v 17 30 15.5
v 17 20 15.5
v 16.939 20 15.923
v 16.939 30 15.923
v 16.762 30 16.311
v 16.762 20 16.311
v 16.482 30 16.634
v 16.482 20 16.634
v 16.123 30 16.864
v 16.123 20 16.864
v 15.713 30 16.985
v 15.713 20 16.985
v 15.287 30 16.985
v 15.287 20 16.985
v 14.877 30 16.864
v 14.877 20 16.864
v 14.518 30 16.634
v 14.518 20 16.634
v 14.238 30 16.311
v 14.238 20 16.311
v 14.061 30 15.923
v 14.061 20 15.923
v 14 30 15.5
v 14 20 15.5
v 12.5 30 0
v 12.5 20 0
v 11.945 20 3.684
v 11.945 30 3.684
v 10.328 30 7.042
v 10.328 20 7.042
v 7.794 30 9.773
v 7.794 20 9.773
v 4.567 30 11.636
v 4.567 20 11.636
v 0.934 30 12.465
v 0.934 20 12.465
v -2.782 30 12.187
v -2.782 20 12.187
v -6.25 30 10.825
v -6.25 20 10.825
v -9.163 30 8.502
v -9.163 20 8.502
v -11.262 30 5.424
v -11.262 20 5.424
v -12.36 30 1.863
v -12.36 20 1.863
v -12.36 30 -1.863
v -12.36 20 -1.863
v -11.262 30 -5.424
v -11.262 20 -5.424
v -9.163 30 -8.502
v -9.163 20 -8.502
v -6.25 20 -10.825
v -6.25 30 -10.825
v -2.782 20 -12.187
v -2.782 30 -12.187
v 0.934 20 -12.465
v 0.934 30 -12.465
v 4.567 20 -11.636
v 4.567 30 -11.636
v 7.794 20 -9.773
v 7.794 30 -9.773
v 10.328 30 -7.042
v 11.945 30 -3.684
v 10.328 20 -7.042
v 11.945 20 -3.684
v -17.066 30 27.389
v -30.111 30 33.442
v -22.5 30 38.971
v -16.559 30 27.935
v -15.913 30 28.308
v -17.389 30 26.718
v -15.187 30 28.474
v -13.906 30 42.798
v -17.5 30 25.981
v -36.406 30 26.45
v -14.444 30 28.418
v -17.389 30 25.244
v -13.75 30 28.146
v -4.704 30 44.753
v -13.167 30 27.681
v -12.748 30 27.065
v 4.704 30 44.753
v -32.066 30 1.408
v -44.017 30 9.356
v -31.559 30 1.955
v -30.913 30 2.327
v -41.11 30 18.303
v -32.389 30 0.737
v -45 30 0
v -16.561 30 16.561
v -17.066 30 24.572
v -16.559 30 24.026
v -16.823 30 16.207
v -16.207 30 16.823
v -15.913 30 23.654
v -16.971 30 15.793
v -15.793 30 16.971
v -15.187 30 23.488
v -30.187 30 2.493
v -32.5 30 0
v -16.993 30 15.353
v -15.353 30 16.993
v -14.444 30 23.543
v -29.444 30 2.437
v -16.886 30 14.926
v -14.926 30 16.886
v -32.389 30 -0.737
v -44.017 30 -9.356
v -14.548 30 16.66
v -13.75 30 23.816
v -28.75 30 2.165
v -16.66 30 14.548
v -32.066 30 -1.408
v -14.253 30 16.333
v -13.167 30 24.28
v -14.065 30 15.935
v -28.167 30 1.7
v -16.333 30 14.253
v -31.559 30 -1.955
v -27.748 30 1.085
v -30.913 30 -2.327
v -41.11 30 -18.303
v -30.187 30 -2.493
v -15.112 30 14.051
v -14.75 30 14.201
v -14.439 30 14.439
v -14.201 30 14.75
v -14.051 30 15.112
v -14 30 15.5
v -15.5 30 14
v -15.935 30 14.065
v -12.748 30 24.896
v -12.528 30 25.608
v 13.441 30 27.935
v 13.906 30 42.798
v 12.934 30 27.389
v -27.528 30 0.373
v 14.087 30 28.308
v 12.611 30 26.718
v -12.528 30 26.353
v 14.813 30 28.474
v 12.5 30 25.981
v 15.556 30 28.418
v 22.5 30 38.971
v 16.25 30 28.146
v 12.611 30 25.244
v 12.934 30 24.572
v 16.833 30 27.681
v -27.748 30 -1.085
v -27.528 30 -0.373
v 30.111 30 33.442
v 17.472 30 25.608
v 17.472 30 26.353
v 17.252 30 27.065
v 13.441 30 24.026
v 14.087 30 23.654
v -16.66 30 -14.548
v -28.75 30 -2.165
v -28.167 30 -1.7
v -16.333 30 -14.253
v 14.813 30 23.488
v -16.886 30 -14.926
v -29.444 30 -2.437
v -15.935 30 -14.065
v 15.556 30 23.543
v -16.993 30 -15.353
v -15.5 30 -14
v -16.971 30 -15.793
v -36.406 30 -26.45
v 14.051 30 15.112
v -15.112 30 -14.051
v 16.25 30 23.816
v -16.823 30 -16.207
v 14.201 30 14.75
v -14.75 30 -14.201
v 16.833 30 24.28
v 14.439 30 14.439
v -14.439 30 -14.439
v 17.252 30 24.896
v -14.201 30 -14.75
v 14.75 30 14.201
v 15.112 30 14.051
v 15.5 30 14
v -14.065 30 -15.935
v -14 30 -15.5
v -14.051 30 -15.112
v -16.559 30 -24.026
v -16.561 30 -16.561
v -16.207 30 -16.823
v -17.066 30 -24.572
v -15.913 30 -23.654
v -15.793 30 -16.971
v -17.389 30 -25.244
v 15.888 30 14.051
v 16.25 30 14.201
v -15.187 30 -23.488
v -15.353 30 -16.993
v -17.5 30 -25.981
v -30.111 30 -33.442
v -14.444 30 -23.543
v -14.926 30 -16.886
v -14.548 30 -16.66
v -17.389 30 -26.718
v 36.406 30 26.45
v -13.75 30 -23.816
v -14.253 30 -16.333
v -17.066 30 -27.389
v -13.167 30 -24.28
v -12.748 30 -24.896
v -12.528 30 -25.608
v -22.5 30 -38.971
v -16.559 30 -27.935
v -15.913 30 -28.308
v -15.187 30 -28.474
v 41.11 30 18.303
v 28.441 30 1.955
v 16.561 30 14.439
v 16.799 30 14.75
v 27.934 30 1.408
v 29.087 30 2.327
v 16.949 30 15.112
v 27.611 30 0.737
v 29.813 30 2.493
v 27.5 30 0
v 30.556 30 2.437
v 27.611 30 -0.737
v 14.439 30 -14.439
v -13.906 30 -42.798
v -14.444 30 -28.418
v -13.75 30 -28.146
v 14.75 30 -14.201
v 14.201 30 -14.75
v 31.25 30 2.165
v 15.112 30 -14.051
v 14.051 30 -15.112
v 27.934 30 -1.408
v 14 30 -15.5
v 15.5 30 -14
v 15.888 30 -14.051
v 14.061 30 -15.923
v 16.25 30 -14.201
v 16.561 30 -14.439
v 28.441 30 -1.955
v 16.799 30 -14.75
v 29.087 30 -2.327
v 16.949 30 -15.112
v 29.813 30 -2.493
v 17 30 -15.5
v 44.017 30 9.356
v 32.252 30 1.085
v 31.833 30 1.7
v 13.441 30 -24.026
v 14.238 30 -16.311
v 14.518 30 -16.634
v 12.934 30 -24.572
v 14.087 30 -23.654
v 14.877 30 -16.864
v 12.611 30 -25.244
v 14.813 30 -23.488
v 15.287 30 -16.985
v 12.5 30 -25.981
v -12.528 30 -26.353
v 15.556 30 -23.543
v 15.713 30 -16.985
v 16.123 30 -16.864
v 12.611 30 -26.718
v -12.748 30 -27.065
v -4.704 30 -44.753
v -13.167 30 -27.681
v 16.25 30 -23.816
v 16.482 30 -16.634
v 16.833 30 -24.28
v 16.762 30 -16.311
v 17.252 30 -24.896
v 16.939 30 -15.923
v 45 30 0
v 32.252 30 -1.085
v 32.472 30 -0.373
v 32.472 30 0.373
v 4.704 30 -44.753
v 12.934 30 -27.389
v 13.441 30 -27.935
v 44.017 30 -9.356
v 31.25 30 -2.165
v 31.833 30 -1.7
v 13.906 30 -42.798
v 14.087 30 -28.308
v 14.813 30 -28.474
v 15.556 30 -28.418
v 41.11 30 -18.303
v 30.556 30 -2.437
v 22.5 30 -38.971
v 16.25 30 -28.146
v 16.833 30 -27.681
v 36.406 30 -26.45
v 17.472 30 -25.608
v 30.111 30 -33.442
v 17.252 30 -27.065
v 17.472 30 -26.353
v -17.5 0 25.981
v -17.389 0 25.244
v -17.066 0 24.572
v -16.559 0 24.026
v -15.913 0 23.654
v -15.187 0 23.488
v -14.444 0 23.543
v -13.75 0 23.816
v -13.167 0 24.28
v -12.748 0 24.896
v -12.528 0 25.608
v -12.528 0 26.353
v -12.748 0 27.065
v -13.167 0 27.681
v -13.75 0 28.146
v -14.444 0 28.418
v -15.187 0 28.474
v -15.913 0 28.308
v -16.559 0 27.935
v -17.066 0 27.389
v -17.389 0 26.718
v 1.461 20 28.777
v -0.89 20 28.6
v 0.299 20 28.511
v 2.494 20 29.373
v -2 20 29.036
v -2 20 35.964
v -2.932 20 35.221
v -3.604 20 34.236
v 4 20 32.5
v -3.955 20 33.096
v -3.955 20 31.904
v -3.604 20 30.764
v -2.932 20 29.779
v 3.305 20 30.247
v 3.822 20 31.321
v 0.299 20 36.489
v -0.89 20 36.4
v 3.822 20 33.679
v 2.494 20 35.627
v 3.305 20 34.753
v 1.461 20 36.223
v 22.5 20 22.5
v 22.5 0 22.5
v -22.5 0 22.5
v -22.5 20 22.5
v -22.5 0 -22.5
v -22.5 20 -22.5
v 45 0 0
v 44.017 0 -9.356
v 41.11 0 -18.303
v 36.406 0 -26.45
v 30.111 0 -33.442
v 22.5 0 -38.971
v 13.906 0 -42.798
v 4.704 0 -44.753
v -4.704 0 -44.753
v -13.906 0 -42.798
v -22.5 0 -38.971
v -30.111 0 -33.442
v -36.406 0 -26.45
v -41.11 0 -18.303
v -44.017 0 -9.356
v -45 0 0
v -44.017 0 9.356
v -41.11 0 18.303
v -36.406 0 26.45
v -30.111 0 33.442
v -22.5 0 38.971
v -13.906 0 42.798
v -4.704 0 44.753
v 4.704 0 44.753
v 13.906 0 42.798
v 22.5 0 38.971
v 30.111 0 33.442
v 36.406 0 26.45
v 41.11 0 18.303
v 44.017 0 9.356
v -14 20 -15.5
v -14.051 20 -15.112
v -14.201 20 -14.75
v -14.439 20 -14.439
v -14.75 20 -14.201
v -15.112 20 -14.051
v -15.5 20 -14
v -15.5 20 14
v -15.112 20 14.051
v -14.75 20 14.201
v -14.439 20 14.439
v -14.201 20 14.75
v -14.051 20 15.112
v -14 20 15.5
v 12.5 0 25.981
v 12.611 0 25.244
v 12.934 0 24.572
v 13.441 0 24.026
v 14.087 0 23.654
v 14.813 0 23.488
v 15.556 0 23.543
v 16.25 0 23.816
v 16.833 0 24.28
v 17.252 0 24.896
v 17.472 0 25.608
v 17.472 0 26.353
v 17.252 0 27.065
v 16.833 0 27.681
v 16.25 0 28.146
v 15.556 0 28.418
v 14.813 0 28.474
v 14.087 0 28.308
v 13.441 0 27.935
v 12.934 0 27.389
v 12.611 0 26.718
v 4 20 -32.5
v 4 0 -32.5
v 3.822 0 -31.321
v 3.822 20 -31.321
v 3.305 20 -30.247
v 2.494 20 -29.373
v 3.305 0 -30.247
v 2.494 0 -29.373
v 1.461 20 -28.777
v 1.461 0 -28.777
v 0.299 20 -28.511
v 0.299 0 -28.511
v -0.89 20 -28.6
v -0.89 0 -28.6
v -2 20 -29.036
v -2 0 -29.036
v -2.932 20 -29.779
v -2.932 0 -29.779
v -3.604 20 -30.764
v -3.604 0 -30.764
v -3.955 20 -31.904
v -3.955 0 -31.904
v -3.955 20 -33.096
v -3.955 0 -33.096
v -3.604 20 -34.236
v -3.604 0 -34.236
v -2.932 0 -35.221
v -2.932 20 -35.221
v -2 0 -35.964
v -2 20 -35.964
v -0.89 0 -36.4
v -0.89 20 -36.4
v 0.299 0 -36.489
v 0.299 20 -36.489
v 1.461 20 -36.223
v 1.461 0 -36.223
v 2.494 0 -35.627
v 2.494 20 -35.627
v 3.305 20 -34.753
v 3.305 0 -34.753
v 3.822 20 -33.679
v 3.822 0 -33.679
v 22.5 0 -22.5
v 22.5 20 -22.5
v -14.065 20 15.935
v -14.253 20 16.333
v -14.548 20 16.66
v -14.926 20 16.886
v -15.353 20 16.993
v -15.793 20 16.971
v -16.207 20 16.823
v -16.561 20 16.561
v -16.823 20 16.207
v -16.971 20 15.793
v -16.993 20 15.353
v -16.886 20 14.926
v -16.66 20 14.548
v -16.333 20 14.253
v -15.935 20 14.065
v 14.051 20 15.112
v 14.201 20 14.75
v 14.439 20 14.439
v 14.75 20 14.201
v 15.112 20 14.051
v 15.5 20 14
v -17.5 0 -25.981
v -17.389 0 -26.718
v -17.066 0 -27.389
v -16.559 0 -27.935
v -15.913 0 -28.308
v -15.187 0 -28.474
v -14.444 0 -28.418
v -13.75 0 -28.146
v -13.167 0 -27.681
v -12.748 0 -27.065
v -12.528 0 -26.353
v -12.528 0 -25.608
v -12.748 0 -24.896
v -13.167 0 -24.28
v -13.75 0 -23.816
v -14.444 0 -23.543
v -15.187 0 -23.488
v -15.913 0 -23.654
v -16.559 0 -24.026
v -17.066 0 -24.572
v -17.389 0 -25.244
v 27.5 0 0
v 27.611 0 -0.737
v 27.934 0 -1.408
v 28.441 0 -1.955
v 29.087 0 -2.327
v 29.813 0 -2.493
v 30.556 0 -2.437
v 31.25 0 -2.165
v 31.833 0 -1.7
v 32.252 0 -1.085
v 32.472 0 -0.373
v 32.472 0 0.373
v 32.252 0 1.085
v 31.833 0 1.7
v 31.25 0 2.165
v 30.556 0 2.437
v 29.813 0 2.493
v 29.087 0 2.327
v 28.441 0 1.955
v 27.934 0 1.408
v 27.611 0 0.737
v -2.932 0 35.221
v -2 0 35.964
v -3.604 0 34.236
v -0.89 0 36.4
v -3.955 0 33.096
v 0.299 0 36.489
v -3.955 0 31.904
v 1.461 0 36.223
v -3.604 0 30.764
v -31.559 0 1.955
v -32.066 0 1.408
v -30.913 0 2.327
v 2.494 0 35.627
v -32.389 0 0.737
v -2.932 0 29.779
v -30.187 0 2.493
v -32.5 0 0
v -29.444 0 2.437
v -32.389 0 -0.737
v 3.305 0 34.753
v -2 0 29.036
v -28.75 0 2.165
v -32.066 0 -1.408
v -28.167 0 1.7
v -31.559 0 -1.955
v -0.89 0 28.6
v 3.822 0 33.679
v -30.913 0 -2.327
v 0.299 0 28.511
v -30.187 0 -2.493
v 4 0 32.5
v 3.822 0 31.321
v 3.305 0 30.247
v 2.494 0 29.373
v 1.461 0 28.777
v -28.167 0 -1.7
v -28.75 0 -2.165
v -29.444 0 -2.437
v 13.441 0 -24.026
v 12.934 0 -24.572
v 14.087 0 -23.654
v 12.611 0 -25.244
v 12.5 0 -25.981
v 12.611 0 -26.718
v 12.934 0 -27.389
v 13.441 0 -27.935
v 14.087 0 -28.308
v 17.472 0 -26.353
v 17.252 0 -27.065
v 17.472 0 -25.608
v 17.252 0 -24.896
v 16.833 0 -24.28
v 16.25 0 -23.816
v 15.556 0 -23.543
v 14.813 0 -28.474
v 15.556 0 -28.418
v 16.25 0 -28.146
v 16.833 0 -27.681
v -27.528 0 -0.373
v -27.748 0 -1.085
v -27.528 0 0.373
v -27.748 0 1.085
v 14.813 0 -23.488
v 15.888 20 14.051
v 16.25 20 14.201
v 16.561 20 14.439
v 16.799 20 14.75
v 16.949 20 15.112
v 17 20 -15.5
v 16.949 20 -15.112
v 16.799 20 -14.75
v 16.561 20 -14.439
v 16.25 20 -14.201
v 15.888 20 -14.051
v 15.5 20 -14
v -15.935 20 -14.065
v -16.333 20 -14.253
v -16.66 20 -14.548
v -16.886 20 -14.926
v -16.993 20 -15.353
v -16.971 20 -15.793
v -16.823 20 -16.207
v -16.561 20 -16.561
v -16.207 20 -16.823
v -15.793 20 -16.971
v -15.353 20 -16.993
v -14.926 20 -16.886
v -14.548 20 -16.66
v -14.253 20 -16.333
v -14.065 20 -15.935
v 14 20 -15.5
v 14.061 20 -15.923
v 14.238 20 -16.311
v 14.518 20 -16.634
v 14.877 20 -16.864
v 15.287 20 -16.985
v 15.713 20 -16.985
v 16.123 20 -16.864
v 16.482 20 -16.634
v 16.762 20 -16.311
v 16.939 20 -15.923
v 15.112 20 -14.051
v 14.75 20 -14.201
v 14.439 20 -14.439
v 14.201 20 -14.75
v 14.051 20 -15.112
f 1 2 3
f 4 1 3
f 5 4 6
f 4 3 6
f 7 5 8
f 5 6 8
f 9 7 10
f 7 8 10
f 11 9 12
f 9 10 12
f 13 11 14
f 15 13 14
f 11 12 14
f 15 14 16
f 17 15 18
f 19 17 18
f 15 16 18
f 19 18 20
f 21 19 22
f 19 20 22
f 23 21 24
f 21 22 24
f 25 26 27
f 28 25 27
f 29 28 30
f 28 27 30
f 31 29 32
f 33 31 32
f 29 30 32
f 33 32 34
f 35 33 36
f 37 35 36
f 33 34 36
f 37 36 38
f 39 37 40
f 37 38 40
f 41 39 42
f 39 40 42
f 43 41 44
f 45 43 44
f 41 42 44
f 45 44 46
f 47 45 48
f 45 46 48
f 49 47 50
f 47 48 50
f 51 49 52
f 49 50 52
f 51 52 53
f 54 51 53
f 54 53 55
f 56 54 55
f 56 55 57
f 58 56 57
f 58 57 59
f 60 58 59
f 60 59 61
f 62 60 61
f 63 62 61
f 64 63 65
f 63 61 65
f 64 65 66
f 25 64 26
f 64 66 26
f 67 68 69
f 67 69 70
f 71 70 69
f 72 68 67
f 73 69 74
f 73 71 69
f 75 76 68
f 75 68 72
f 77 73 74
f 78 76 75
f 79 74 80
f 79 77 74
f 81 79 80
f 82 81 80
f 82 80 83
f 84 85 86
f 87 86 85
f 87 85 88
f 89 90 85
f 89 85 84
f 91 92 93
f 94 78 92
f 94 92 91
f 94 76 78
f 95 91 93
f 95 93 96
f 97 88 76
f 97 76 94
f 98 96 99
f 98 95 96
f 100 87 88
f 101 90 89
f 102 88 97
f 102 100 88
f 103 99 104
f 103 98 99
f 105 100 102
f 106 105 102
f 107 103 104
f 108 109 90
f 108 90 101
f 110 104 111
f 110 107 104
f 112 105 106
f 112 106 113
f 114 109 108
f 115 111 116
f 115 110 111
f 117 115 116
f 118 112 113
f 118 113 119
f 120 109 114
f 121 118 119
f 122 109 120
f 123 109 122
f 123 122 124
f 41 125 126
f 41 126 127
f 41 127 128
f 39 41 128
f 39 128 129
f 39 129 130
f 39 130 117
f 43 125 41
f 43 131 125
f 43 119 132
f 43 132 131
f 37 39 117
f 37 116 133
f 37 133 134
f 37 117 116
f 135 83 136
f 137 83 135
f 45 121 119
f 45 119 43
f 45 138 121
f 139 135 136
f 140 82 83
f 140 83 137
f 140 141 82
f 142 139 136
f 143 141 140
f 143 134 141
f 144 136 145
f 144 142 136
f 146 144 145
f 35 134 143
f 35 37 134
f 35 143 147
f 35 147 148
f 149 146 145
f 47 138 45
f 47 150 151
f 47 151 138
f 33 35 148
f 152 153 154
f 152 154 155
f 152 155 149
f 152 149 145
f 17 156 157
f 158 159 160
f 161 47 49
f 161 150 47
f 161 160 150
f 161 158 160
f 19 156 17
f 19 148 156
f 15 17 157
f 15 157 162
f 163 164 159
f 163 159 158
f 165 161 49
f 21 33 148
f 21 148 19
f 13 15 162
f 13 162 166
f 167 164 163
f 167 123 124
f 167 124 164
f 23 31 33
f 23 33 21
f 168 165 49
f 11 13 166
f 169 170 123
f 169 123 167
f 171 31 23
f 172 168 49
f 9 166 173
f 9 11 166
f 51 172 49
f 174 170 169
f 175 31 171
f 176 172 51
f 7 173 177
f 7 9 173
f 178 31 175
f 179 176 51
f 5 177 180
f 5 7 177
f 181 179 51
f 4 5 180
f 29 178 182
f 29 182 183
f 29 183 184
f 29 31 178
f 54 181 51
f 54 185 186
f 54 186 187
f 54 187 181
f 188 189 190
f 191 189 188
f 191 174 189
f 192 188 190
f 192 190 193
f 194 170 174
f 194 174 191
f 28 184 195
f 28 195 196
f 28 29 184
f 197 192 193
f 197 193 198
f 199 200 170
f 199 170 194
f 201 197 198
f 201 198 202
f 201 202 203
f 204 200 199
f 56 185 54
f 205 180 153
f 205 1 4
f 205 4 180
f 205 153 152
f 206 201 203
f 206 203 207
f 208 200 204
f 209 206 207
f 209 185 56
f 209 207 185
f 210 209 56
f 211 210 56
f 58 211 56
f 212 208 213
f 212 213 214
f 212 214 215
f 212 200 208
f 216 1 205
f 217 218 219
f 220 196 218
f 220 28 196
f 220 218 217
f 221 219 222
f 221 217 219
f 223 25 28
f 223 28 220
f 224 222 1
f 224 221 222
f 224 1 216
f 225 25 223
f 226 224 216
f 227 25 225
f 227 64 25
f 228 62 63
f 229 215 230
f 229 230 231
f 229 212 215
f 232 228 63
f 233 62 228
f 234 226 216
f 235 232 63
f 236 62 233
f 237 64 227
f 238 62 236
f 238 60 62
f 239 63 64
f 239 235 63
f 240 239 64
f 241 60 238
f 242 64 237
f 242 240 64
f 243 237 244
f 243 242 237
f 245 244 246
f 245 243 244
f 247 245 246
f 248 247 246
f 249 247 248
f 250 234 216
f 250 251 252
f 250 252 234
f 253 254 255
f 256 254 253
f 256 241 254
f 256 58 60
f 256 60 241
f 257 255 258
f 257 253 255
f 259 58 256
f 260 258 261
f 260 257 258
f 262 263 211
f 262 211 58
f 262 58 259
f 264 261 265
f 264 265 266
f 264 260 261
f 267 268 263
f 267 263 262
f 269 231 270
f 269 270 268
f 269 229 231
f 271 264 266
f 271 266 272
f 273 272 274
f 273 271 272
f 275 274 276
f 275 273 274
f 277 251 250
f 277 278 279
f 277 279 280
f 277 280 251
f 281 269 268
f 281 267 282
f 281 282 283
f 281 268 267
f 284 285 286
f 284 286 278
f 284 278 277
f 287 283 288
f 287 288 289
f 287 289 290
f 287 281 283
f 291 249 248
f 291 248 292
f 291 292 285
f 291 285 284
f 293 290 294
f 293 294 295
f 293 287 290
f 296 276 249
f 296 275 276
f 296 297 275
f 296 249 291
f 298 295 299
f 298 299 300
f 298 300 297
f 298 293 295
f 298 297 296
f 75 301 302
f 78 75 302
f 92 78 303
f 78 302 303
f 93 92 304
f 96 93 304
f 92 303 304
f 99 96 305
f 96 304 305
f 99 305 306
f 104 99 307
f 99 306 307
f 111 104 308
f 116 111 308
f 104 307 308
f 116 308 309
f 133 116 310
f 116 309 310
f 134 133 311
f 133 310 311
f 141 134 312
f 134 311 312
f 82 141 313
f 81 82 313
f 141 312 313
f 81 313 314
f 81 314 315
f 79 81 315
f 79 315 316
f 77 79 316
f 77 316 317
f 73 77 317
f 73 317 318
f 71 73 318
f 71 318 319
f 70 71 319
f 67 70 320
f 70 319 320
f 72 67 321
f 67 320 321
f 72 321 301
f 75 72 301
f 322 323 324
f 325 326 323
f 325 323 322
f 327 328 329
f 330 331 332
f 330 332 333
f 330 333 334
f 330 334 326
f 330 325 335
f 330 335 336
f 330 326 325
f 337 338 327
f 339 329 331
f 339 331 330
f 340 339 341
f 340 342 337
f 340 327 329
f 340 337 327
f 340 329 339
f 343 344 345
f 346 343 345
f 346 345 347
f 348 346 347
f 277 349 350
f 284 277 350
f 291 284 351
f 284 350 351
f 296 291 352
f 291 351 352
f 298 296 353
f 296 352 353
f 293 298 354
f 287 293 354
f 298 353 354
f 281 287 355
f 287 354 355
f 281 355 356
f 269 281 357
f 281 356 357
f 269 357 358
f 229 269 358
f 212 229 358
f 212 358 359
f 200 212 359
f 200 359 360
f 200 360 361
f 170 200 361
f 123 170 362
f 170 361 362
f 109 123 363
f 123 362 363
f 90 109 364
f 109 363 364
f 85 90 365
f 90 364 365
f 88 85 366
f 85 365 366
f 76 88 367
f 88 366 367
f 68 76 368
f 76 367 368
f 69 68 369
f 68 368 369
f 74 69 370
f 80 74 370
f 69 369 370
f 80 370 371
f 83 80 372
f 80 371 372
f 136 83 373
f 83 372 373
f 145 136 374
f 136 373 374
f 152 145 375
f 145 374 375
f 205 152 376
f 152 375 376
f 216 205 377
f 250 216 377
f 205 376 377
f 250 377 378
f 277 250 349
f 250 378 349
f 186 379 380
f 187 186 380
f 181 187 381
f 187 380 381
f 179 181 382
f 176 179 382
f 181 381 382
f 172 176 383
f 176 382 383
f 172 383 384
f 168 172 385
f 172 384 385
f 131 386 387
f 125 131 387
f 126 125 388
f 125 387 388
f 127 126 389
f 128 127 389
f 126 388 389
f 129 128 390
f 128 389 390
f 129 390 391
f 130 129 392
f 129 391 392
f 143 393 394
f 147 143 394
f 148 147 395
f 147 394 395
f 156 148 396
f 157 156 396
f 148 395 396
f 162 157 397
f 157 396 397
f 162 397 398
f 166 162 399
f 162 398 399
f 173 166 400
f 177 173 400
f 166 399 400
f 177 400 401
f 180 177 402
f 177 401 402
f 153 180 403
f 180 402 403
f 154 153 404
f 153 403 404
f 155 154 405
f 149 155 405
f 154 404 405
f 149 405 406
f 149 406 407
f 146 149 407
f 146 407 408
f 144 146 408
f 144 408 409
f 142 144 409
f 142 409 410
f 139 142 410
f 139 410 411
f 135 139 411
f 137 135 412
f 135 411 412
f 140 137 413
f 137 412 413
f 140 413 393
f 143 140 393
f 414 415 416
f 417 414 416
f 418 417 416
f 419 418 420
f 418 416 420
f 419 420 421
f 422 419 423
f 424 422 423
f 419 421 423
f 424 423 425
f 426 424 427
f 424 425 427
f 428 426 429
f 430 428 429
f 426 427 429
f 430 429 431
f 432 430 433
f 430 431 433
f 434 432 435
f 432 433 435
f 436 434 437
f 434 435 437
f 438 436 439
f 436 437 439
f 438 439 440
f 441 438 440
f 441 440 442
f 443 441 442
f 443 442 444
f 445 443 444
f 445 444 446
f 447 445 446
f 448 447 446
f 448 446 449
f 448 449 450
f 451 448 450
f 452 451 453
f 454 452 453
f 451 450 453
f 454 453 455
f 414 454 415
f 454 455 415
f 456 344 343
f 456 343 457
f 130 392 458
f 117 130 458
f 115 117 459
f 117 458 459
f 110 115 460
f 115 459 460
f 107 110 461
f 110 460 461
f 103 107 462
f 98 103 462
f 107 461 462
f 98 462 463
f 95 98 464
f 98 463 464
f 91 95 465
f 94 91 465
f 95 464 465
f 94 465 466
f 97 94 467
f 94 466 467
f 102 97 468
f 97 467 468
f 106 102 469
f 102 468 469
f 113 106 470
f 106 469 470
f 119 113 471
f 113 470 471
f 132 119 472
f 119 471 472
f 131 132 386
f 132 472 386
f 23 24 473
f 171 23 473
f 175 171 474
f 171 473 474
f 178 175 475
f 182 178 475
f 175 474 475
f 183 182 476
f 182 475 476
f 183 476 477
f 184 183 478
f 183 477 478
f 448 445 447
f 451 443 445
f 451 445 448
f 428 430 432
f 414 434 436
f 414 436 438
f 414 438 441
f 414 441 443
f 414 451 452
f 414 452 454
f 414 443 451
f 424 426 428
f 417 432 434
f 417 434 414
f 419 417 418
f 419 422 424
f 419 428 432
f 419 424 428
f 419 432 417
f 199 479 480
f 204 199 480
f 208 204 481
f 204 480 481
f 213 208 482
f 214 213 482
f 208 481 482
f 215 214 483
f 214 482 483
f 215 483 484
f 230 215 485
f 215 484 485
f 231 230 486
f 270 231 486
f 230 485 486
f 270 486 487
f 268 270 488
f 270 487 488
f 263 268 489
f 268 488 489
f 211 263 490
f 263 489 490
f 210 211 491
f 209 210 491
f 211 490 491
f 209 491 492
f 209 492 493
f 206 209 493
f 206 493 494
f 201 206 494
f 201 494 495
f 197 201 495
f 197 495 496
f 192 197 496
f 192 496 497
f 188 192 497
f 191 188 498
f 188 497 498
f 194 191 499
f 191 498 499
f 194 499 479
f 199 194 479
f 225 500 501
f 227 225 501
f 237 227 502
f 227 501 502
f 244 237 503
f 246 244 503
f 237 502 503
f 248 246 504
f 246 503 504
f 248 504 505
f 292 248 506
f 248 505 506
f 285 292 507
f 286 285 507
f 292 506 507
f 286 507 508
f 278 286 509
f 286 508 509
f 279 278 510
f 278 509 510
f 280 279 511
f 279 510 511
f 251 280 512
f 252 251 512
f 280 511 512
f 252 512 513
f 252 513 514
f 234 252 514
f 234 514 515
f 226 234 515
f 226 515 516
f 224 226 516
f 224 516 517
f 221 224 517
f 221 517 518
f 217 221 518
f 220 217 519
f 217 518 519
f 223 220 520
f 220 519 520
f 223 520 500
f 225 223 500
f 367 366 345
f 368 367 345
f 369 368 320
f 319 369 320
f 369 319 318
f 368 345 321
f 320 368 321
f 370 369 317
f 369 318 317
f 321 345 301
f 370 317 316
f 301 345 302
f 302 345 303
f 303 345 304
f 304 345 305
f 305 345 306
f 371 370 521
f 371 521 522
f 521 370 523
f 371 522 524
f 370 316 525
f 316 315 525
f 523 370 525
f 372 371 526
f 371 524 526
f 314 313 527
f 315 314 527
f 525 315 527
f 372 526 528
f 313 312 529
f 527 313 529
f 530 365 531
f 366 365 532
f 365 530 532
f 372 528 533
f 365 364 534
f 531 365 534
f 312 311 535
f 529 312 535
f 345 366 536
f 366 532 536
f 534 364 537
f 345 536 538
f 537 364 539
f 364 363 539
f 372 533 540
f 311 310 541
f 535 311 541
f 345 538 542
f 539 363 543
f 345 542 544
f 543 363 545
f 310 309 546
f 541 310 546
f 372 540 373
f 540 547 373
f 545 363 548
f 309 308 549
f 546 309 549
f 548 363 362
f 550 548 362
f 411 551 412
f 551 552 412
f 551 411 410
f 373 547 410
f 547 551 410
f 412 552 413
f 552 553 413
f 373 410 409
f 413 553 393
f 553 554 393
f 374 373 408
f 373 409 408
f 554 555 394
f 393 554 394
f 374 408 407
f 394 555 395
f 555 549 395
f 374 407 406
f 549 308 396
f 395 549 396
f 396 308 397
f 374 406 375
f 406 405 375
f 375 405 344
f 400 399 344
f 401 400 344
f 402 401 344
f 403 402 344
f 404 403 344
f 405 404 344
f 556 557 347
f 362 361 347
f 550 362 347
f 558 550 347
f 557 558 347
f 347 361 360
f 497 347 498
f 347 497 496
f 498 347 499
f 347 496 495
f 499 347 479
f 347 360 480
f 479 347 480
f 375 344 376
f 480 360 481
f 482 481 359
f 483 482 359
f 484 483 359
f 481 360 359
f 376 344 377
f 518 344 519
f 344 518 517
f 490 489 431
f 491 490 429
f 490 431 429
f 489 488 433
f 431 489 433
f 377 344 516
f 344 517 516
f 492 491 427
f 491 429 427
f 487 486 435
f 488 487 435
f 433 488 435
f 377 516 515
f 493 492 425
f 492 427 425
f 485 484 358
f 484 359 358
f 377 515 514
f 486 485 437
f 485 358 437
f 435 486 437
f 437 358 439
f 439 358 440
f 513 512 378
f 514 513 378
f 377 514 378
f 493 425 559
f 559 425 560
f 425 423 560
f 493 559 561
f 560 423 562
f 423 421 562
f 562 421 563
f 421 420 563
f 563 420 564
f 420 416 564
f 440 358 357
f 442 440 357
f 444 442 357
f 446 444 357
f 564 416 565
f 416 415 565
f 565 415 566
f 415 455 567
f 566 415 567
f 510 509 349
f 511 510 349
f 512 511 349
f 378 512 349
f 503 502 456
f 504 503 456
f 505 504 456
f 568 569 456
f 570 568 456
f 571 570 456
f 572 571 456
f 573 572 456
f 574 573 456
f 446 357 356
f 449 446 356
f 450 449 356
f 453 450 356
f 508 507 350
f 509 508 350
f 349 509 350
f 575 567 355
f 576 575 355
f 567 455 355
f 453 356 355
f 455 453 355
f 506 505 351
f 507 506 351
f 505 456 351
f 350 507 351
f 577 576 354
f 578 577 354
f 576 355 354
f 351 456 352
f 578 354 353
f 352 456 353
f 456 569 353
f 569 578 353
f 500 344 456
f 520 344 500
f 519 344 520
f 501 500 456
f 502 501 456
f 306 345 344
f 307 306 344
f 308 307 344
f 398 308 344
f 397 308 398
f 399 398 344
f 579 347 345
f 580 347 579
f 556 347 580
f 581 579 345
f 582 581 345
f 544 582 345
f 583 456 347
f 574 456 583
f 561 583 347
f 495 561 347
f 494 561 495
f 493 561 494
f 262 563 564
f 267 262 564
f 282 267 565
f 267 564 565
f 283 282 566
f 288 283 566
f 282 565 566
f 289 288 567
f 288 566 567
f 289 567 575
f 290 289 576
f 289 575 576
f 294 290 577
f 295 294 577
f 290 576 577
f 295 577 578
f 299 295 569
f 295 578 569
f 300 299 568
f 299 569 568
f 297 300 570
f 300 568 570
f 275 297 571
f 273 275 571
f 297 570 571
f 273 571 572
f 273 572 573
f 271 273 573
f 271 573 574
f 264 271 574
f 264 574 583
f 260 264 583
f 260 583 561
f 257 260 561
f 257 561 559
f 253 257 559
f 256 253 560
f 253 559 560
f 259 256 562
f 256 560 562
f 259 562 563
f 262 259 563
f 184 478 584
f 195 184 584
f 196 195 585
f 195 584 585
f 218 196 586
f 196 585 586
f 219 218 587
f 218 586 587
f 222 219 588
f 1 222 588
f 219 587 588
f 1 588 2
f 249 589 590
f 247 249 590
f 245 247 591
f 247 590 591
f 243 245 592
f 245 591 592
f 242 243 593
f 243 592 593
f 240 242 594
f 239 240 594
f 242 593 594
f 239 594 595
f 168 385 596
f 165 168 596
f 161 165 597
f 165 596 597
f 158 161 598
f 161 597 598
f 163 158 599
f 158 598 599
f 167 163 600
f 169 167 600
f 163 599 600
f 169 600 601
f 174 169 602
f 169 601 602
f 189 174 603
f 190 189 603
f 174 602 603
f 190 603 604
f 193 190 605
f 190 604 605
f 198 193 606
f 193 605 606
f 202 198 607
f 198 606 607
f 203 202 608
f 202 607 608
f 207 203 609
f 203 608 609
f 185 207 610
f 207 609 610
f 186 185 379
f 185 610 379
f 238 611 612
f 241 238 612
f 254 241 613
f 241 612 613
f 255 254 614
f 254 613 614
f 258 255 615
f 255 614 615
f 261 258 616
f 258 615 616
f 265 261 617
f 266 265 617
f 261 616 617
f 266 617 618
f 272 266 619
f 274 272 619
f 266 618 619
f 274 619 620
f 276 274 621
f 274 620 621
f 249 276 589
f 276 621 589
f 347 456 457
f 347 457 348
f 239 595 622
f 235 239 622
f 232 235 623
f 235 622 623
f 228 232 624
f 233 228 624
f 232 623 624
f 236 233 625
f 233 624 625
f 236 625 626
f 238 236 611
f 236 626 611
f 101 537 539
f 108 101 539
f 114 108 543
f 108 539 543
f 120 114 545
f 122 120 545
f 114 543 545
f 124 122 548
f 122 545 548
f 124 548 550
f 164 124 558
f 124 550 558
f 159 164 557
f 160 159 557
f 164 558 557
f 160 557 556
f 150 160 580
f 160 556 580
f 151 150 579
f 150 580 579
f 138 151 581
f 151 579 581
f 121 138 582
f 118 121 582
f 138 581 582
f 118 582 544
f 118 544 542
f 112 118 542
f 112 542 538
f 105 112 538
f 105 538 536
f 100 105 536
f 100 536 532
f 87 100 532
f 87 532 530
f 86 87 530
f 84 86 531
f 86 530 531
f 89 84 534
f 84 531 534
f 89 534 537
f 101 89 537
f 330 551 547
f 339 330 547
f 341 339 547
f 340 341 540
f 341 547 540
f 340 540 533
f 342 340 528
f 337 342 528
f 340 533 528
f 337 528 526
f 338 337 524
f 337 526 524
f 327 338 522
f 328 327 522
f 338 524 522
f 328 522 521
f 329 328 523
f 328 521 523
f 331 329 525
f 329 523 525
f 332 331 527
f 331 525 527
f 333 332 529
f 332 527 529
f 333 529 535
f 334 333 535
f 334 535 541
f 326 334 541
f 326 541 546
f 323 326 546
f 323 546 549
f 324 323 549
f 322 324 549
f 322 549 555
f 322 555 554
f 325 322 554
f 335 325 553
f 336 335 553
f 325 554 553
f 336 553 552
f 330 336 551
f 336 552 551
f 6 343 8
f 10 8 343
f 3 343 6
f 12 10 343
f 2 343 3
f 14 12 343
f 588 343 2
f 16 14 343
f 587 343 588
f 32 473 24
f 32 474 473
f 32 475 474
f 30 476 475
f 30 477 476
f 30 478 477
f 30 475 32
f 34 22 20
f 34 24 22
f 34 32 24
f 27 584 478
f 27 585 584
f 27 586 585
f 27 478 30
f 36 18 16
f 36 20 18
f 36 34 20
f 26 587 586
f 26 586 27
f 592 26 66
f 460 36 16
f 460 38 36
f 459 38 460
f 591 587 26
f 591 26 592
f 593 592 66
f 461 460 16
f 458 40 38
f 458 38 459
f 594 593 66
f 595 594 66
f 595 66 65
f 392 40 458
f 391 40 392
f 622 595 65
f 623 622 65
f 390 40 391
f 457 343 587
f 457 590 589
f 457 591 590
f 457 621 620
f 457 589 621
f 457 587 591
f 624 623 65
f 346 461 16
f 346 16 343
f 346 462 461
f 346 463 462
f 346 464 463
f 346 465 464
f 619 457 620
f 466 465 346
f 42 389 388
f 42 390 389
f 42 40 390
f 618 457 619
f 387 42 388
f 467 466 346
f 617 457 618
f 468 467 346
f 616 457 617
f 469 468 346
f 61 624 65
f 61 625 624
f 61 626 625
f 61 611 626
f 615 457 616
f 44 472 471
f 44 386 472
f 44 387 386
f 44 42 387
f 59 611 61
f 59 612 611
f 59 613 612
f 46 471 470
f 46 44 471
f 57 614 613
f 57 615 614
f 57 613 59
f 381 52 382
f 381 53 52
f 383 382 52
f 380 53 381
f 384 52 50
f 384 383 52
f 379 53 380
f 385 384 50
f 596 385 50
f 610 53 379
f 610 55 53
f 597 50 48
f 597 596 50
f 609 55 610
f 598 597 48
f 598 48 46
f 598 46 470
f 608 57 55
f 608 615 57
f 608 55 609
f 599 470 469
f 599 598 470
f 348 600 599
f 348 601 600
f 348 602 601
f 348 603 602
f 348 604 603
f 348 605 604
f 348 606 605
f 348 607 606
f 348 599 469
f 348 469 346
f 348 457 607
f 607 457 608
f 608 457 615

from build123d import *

# Parameters (mm, degrees)
SKETCH1_R           = 45
BOSS_EXTRUDE1_DEPTH = 30
SKETCH2_R           = 4
CUT_EXTRUDE1_DEPTH  = 20
SKETCH4_R           = 2.5
CUT_EXTRUDE2_DEPTH  = 30
SKETCH5_W           = 45
SKETCH5_H           = 45
CUT_EXTRUDE3_DEPTH  = 20
SKETCH6_R           = 12.5
CUT_EXTRUDE4_DEPTH  = 10


with BuildPart() as part:
    # Sketch1 → Boss-Extrude1 (new body)
    with BuildSketch(Plane(origin=(0, 0, 0), x_dir=(1, 0, 0), z_dir=(0, 1, 0))):
        Circle(SKETCH1_R)
    extrude(amount=BOSS_EXTRUDE1_DEPTH)

    # Sketch2 → Cut-Extrude1 (cut)
    with BuildSketch(Plane.XZ):
        with Locations((0, 32.5)):
            Circle(SKETCH2_R)
        with Locations((0, -32.5)):
            Circle(SKETCH2_R)
    extrude(amount=-CUT_EXTRUDE1_DEPTH, mode=Mode.SUBTRACT)

    # Sketch4 → Cut-Extrude2 (cut)
    with BuildSketch(Plane(origin=(0, 0, 0), x_dir=(-1, 0, 0), z_dir=(0, -1, 0))):
        with Locations((-30, 0)):
            Circle(SKETCH4_R)
        with Locations((-15, 25.980762114)):
            Circle(SKETCH4_R)
        with Locations((15, 25.980762114)):
            Circle(SKETCH4_R)
        with Locations((30, 0)):
            Circle(SKETCH4_R)
        with Locations((15, -25.980762114)):
            Circle(SKETCH4_R)
        with Locations((-15, -25.980762114)):
            Circle(SKETCH4_R)
    extrude(amount=-CUT_EXTRUDE2_DEPTH, mode=Mode.SUBTRACT)

    # Sketch5 → Cut-Extrude3 (cut)
    with BuildSketch(Plane(origin=(0, 0, 0), x_dir=(-1, 0, 0), z_dir=(0, -1, 0))):
        Rectangle(SKETCH5_W, SKETCH5_H)
    extrude(amount=-CUT_EXTRUDE3_DEPTH, mode=Mode.SUBTRACT)

    # Sketch6 → Cut-Extrude4 (cut)
    with BuildSketch(Plane.XZ.offset(-20)):
        with BuildLine():
            Line((-15.5, 14), (-15.5, 15.5))
            Line((-15.5, 15.5), (-14, 15.5))
            ThreePointArc((-14, 15.5), (-16.560660172, 16.560660172), (-15.5, 14))
        make_face()
        with BuildLine():
            Line((-14, 15.5), (-15.5, 15.5))
            Line((-15.5, 15.5), (-15.5, 14))
            ThreePointArc((-15.5, 14), (-14.439339828, 14.439339828), (-14, 15.5))
        make_face()
        with BuildLine():
            ThreePointArc((17, 15.5), (15.5, 17), (14, 15.5))
            Line((14, 15.5), (15.5, 15.5))
            Line((15.5, 15.5), (15.5, 14))
            ThreePointArc((15.5, 14), (16.560660172, 14.439339828), (17, 15.5))
        make_face()
        with BuildLine():
            Line((15.5, 15.5), (14, 15.5))
            ThreePointArc((14, 15.5), (14.439339828, 14.439339828), (15.5, 14))
            Line((15.5, 14), (15.5, 15.5))
        make_face()
        Circle(SKETCH6_R)
        with BuildLine():
            ThreePointArc((17, -15.5), (16.560660172, -14.439339828), (15.5, -14))
            Line((15.5, -14), (15.5, -15.5))
            Line((15.5, -15.5), (14, -15.5))
            ThreePointArc((14, -15.5), (15.5, -17), (17, -15.5))
        make_face()
        with BuildLine():
            Line((15.5, -15.5), (15.5, -14))
            ThreePointArc((15.5, -14), (14.439339828, -14.439339828), (14, -15.5))
            Line((14, -15.5), (15.5, -15.5))
        make_face()
        with BuildLine():
            ThreePointArc((-14, -15.5), (-14.439339828, -14.439339828), (-15.5, -14))
            Line((-15.5, -14), (-15.5, -15.5))
            Line((-15.5, -15.5), (-14, -15.5))
        make_face()
        with BuildLine():
            Line((-15.5, -15.5), (-15.5, -14))
            ThreePointArc((-15.5, -14), (-16.560660172, -16.560660172), (-14, -15.5))
            Line((-14, -15.5), (-15.5, -15.5))
        make_face()
    extrude(amount=-CUT_EXTRUDE4_DEPTH, mode=Mode.SUBTRACT)


solid = part.part
